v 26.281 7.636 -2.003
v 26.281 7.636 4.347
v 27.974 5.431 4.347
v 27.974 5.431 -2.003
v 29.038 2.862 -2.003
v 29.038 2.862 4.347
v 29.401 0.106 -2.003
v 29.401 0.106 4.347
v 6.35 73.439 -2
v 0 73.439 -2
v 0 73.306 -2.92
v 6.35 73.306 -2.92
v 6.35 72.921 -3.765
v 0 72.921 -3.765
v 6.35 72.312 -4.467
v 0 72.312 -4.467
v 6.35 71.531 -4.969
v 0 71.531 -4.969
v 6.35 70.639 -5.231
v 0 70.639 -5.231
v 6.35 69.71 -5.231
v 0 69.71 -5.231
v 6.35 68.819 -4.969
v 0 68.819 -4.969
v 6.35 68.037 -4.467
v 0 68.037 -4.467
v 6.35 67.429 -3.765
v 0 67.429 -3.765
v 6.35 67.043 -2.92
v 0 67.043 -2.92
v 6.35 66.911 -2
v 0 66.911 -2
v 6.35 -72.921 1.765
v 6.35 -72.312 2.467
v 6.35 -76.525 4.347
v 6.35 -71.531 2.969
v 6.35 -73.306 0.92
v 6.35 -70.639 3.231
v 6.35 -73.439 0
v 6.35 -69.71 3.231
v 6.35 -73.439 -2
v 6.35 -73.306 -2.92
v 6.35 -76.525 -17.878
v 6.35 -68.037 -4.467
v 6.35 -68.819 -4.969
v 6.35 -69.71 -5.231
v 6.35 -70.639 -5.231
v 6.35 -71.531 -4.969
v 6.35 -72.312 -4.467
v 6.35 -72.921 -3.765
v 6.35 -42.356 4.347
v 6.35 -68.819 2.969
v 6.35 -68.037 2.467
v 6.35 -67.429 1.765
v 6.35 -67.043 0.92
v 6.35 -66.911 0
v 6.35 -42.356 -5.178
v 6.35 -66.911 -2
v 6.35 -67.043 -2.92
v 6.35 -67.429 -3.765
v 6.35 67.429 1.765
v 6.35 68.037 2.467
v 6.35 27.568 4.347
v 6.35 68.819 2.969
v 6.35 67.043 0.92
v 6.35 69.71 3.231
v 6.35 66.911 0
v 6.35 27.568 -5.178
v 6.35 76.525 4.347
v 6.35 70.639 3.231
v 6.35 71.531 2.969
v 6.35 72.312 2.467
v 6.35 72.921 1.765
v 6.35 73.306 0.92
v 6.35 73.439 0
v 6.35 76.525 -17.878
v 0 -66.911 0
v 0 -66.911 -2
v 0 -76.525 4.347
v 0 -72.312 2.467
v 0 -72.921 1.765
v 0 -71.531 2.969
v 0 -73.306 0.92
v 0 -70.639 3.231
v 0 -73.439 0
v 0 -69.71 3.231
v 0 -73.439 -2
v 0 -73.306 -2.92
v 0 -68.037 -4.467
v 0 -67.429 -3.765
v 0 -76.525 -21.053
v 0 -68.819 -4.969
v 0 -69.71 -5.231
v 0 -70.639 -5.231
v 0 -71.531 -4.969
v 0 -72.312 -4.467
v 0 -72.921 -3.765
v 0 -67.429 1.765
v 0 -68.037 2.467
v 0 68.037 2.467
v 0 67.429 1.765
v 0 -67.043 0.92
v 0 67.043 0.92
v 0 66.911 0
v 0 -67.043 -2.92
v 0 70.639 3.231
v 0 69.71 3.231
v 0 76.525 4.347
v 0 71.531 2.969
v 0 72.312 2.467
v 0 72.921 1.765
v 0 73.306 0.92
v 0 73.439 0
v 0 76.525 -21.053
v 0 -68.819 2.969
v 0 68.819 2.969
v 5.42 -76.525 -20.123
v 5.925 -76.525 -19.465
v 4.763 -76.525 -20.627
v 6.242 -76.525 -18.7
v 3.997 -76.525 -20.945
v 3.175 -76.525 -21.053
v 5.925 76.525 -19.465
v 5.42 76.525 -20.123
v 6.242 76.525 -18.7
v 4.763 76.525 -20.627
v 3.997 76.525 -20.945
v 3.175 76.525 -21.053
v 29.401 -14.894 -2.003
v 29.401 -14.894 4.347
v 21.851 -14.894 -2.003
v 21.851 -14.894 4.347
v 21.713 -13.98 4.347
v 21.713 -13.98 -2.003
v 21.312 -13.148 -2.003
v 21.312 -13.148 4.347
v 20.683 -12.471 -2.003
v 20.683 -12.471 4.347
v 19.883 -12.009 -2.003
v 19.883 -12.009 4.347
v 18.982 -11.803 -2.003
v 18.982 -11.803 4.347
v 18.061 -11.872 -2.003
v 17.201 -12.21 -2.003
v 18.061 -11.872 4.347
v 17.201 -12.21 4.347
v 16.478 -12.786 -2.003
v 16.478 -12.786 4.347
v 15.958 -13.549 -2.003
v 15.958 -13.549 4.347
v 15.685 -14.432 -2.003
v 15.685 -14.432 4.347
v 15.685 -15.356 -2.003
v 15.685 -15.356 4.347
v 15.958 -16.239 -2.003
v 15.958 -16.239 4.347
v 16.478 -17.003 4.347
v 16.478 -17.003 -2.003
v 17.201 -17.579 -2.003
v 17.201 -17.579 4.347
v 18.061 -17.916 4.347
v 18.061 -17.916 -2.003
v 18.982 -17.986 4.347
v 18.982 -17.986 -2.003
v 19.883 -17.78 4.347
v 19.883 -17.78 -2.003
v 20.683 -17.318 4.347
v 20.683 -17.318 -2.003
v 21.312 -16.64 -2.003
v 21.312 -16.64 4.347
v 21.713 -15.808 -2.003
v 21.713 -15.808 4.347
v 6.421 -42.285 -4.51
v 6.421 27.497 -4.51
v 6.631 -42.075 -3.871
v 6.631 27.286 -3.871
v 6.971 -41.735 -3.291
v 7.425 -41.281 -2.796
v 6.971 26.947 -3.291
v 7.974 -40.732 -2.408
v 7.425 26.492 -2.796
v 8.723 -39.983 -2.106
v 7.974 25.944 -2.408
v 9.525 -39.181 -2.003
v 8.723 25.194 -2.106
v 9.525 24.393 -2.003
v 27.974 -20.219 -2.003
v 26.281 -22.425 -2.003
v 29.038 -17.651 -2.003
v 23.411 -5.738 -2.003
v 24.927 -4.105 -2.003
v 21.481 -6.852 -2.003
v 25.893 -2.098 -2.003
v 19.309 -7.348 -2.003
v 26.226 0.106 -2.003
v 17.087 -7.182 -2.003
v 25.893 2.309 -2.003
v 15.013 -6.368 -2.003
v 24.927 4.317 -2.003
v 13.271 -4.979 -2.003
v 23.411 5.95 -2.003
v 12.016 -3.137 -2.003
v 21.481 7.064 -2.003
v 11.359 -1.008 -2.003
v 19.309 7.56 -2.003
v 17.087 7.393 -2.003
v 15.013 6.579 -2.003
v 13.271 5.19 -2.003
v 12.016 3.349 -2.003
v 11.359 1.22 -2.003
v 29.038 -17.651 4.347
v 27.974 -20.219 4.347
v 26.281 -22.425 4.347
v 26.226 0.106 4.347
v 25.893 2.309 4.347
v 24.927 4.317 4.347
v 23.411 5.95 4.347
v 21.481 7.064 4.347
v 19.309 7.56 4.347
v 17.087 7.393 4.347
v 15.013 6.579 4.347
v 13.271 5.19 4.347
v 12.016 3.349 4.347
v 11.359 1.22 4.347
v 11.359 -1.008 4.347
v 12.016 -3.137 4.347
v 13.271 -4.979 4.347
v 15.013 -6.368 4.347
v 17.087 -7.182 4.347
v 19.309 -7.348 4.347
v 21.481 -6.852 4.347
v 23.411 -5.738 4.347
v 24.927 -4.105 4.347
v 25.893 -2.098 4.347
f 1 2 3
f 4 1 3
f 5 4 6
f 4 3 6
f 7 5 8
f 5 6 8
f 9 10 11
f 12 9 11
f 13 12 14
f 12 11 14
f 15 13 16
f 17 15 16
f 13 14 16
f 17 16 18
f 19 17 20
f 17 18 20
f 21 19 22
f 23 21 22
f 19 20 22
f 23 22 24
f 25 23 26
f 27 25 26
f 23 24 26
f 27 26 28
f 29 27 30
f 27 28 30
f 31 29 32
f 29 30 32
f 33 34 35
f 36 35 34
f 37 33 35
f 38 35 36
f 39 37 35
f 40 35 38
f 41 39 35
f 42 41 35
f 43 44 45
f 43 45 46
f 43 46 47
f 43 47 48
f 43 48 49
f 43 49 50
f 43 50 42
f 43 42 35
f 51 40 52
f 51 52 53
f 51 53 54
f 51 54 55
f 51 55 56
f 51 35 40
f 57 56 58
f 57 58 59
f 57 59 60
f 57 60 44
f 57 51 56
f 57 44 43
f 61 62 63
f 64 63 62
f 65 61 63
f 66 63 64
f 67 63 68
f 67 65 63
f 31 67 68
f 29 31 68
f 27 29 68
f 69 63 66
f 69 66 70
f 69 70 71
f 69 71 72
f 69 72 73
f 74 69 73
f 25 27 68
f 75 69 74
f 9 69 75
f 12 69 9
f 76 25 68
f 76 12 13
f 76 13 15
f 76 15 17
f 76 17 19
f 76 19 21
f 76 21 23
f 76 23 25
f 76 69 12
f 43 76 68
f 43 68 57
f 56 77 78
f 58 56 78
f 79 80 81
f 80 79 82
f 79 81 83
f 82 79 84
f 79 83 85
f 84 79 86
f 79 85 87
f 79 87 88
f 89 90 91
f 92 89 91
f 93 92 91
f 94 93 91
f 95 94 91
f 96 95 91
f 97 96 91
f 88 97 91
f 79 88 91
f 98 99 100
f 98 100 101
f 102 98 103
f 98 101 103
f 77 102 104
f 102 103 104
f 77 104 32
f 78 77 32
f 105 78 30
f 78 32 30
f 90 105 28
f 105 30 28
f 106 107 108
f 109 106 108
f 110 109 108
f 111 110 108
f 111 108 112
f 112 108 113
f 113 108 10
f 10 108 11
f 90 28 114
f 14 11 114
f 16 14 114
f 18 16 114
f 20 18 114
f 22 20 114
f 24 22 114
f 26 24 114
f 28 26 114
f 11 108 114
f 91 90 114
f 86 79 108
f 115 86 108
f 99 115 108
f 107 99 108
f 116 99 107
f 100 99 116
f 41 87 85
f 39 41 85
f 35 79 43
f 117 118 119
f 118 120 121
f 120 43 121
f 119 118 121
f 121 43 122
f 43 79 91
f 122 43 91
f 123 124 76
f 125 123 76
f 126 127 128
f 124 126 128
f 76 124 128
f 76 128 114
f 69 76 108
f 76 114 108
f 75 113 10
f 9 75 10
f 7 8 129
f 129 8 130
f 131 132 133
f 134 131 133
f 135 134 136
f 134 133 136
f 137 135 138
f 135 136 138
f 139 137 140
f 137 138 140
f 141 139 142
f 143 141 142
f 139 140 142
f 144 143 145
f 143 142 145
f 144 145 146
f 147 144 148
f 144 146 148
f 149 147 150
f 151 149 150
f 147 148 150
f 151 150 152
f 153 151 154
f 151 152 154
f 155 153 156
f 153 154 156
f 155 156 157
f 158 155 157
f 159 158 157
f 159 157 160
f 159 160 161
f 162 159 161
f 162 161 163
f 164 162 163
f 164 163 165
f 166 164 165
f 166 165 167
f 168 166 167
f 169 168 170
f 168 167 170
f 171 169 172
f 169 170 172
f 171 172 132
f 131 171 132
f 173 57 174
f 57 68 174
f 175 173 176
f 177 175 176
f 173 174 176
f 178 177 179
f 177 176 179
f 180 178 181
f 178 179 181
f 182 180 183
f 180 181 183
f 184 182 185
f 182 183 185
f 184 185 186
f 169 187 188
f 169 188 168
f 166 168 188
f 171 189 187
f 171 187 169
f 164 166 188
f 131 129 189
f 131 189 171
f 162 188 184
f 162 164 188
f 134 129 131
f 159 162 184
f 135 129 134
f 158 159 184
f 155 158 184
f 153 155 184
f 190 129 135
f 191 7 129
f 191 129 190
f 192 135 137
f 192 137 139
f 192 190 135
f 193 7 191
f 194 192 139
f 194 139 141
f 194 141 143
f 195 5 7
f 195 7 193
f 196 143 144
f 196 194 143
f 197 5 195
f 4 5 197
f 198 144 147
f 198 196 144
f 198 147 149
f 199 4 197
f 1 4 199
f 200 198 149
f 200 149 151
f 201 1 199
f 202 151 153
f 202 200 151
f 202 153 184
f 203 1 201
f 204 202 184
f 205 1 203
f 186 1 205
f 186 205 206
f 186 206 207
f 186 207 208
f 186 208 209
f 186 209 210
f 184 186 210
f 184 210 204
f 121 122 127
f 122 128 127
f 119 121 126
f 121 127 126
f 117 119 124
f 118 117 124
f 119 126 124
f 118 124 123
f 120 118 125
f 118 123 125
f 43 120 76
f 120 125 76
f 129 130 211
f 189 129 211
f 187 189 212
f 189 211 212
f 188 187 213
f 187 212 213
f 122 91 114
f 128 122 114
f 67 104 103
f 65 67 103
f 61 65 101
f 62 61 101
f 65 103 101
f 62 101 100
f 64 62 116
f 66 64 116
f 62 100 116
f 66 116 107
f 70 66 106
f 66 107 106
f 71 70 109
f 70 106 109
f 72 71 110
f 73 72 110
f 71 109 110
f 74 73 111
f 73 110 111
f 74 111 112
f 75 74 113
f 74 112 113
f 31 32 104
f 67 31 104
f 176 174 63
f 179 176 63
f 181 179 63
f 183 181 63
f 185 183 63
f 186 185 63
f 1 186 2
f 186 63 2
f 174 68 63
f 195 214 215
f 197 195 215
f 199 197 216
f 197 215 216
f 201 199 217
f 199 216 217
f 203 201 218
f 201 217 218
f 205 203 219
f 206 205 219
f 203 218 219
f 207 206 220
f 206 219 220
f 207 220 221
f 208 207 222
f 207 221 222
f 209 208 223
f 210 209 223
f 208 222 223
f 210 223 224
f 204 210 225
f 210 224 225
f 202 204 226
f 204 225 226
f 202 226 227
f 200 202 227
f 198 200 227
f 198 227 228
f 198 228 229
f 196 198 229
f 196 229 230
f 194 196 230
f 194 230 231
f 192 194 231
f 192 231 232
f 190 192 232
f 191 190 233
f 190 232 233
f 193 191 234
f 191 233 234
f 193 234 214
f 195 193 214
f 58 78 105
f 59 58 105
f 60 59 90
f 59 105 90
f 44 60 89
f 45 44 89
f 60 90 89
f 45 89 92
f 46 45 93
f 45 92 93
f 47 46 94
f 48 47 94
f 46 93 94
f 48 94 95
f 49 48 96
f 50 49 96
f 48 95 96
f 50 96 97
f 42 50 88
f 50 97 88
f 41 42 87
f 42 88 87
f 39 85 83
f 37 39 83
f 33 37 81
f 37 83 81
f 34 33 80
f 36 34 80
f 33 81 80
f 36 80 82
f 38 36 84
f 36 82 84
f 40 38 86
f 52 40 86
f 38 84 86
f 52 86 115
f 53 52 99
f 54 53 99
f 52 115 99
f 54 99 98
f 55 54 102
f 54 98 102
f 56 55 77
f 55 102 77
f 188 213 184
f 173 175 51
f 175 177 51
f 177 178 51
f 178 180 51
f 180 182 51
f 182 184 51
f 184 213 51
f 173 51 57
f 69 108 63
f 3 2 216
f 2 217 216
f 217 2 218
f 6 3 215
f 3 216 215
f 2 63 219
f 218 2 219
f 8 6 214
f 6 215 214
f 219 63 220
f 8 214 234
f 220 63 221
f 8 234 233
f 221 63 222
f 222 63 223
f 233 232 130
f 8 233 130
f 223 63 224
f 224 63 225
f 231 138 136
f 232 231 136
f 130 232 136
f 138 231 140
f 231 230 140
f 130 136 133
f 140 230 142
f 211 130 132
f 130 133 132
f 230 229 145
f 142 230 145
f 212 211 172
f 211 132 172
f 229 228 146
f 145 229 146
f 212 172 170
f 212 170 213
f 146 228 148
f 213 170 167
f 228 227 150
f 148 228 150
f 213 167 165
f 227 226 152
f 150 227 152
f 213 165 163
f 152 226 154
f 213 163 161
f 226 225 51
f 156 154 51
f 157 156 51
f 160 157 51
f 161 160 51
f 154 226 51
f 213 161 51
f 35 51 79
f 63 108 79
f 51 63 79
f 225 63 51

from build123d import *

# Parameters (mm, degrees)
BOSS_EXTRUDE1_DEPTH = 6.35
SKETCH2_R           = 7.475
SKETCH2_R_2         = 3.0999938
BOSS_EXTRUDE2_DEPTH = 6.35
FILLET1_R           = 3.175


with BuildPart() as part:
    # Sketch1 → Boss-Extrude1 (new body)
    with BuildSketch(Plane(origin=(0, 0, 0), x_dir=(0, 0, -1), z_dir=(1, 0, 0))):
        Polygon((-4.34721, -76.524739), (4.34721, -76.524739), (21.05279, -76.524739), (21.05279, 76.524739), (4.34721, 76.524739), (-4.34721, 76.524739), align=None)
        with BuildLine():
            Line((0, 73.438639), (2, 73.438639))
            ThreePointArc((2, 73.438639), (5.2639, 70.174739), (2, 66.910839))
            Line((2, 66.910839), (0, 66.910839))
            ThreePointArc((0, 66.910839), (-3.2639, 70.174739), (0, 73.438639))
        make_face(mode=Mode.SUBTRACT)
        with BuildLine():
            Line((0, -66.910839), (2, -66.910839))
            ThreePointArc((2, -66.910839), (5.2639, -70.174739), (2, -73.438639))
            Line((2, -73.438639), (0, -73.438639))
            ThreePointArc((0, -73.438639), (-3.2639, -70.174739), (0, -66.910839))
        make_face(mode=Mode.SUBTRACT)
    extrude(amount=BOSS_EXTRUDE1_DEPTH)

    # Sketch2 → Boss-Extrude2 (add)
    with BuildSketch(Plane.XY.offset(4.34721)):
        with BuildLine():
            Line((6.35, 27.567699439), (26.28122122, 7.63647822))
            ThreePointArc((26.28122122, 7.63647822), (28.589851021, 4.181369555), (29.400534, 0.105791))
            Line((29.400534, 0.105791), (29.400534, -14.894209))
            ThreePointArc((29.400534, -14.894209), (28.589851021, -18.969787555), (26.28122122, -22.42489622))
            Line((26.28122122, -22.42489622), (6.35, -42.356117439))
            Line((6.35, -42.356117439), (6.35, 27.567699439))
        make_face()
        with Locations((18.750534, 0.105791)):
            Circle(SKETCH2_R, mode=Mode.SUBTRACT)
        with Locations((18.750534, -14.894209)):
            Circle(SKETCH2_R_2, mode=Mode.SUBTRACT)
    extrude(amount=-BOSS_EXTRUDE2_DEPTH)

    # Fillet1
    fillet1_edges = [part.edges().sort_by_distance(p)[0] for p in [
        (6.35, 0, -21.05279),
        (6.35, -7.394209, -2.00279),
    ]]
    fillet(fillet1_edges, radius=FILLET1_R)


solid = part.part
